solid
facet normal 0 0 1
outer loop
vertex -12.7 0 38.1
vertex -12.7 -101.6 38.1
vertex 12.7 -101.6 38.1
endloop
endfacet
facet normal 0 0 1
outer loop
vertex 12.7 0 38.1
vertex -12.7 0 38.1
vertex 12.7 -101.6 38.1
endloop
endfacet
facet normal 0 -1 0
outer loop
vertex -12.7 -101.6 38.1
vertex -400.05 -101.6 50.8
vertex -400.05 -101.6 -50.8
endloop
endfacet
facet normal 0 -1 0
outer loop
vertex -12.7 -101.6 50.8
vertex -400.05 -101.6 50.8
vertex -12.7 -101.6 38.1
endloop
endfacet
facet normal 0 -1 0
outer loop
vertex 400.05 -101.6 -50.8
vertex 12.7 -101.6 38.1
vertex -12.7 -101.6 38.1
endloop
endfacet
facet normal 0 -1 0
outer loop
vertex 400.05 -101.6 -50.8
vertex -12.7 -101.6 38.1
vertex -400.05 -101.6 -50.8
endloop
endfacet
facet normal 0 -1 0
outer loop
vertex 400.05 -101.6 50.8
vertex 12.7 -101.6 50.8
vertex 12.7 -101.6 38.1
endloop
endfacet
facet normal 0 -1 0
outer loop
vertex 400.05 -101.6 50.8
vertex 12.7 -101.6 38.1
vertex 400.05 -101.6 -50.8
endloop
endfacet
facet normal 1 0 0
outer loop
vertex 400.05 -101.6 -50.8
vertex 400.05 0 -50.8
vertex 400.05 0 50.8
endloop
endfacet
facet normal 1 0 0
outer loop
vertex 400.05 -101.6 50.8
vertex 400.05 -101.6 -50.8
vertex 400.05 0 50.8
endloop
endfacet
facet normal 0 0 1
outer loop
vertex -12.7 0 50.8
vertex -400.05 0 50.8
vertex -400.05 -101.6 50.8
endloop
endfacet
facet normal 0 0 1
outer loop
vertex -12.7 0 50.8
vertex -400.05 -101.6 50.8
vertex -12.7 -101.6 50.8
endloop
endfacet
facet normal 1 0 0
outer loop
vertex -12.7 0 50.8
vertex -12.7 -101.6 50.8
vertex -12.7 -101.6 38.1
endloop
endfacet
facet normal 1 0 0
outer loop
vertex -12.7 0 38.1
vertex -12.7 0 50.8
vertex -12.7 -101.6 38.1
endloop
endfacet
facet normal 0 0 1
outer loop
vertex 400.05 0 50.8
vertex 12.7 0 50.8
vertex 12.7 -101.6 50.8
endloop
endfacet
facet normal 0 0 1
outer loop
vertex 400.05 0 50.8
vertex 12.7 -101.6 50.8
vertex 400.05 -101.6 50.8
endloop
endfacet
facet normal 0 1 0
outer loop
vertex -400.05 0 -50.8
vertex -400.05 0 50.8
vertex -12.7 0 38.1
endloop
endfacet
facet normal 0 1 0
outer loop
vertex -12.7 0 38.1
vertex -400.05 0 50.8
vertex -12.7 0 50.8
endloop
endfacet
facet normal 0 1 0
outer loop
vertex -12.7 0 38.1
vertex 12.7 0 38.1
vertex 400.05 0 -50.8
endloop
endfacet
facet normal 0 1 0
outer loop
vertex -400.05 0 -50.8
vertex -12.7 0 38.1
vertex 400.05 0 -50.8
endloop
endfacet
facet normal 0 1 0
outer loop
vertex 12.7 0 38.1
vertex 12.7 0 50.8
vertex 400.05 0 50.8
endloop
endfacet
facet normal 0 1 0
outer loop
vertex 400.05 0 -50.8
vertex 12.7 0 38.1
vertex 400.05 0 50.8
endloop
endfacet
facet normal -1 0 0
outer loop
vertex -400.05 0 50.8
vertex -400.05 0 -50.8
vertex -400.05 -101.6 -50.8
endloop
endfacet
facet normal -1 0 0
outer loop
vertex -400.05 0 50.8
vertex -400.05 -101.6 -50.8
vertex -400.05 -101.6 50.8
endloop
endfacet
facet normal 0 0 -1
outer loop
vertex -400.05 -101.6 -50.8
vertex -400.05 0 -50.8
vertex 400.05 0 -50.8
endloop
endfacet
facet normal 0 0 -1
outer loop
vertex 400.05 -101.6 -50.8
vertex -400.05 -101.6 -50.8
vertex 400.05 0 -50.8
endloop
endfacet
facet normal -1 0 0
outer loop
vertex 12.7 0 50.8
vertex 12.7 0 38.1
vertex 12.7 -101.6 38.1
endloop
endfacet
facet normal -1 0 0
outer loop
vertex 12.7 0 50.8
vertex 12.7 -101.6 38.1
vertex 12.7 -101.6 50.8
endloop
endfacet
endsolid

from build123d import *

# Parameters (mm, degrees)
F0_W     = 800.1
F0_H     = 101.6
F1_DEPTH = 101.6
F3_DEPTH = 101.601


with BuildPart() as f1:
    # F0 (on Front) → F1 (new body)
    with BuildSketch(Plane.XZ):
        Rectangle(F0_W, F0_H)
    extrude(amount=F1_DEPTH)

    # F2 (on face) → F3 (cut, through all)
    with BuildSketch(Plane.XZ.offset(101.6)):
        Polygon((12.7, 38.1), (12.7, 63.5), (-12.7, 63.5), (-12.7, 38.1), (0, 38.1), align=None)
    extrude(amount=-F3_DEPTH, mode=Mode.SUBTRACT)


solid = f1.part
